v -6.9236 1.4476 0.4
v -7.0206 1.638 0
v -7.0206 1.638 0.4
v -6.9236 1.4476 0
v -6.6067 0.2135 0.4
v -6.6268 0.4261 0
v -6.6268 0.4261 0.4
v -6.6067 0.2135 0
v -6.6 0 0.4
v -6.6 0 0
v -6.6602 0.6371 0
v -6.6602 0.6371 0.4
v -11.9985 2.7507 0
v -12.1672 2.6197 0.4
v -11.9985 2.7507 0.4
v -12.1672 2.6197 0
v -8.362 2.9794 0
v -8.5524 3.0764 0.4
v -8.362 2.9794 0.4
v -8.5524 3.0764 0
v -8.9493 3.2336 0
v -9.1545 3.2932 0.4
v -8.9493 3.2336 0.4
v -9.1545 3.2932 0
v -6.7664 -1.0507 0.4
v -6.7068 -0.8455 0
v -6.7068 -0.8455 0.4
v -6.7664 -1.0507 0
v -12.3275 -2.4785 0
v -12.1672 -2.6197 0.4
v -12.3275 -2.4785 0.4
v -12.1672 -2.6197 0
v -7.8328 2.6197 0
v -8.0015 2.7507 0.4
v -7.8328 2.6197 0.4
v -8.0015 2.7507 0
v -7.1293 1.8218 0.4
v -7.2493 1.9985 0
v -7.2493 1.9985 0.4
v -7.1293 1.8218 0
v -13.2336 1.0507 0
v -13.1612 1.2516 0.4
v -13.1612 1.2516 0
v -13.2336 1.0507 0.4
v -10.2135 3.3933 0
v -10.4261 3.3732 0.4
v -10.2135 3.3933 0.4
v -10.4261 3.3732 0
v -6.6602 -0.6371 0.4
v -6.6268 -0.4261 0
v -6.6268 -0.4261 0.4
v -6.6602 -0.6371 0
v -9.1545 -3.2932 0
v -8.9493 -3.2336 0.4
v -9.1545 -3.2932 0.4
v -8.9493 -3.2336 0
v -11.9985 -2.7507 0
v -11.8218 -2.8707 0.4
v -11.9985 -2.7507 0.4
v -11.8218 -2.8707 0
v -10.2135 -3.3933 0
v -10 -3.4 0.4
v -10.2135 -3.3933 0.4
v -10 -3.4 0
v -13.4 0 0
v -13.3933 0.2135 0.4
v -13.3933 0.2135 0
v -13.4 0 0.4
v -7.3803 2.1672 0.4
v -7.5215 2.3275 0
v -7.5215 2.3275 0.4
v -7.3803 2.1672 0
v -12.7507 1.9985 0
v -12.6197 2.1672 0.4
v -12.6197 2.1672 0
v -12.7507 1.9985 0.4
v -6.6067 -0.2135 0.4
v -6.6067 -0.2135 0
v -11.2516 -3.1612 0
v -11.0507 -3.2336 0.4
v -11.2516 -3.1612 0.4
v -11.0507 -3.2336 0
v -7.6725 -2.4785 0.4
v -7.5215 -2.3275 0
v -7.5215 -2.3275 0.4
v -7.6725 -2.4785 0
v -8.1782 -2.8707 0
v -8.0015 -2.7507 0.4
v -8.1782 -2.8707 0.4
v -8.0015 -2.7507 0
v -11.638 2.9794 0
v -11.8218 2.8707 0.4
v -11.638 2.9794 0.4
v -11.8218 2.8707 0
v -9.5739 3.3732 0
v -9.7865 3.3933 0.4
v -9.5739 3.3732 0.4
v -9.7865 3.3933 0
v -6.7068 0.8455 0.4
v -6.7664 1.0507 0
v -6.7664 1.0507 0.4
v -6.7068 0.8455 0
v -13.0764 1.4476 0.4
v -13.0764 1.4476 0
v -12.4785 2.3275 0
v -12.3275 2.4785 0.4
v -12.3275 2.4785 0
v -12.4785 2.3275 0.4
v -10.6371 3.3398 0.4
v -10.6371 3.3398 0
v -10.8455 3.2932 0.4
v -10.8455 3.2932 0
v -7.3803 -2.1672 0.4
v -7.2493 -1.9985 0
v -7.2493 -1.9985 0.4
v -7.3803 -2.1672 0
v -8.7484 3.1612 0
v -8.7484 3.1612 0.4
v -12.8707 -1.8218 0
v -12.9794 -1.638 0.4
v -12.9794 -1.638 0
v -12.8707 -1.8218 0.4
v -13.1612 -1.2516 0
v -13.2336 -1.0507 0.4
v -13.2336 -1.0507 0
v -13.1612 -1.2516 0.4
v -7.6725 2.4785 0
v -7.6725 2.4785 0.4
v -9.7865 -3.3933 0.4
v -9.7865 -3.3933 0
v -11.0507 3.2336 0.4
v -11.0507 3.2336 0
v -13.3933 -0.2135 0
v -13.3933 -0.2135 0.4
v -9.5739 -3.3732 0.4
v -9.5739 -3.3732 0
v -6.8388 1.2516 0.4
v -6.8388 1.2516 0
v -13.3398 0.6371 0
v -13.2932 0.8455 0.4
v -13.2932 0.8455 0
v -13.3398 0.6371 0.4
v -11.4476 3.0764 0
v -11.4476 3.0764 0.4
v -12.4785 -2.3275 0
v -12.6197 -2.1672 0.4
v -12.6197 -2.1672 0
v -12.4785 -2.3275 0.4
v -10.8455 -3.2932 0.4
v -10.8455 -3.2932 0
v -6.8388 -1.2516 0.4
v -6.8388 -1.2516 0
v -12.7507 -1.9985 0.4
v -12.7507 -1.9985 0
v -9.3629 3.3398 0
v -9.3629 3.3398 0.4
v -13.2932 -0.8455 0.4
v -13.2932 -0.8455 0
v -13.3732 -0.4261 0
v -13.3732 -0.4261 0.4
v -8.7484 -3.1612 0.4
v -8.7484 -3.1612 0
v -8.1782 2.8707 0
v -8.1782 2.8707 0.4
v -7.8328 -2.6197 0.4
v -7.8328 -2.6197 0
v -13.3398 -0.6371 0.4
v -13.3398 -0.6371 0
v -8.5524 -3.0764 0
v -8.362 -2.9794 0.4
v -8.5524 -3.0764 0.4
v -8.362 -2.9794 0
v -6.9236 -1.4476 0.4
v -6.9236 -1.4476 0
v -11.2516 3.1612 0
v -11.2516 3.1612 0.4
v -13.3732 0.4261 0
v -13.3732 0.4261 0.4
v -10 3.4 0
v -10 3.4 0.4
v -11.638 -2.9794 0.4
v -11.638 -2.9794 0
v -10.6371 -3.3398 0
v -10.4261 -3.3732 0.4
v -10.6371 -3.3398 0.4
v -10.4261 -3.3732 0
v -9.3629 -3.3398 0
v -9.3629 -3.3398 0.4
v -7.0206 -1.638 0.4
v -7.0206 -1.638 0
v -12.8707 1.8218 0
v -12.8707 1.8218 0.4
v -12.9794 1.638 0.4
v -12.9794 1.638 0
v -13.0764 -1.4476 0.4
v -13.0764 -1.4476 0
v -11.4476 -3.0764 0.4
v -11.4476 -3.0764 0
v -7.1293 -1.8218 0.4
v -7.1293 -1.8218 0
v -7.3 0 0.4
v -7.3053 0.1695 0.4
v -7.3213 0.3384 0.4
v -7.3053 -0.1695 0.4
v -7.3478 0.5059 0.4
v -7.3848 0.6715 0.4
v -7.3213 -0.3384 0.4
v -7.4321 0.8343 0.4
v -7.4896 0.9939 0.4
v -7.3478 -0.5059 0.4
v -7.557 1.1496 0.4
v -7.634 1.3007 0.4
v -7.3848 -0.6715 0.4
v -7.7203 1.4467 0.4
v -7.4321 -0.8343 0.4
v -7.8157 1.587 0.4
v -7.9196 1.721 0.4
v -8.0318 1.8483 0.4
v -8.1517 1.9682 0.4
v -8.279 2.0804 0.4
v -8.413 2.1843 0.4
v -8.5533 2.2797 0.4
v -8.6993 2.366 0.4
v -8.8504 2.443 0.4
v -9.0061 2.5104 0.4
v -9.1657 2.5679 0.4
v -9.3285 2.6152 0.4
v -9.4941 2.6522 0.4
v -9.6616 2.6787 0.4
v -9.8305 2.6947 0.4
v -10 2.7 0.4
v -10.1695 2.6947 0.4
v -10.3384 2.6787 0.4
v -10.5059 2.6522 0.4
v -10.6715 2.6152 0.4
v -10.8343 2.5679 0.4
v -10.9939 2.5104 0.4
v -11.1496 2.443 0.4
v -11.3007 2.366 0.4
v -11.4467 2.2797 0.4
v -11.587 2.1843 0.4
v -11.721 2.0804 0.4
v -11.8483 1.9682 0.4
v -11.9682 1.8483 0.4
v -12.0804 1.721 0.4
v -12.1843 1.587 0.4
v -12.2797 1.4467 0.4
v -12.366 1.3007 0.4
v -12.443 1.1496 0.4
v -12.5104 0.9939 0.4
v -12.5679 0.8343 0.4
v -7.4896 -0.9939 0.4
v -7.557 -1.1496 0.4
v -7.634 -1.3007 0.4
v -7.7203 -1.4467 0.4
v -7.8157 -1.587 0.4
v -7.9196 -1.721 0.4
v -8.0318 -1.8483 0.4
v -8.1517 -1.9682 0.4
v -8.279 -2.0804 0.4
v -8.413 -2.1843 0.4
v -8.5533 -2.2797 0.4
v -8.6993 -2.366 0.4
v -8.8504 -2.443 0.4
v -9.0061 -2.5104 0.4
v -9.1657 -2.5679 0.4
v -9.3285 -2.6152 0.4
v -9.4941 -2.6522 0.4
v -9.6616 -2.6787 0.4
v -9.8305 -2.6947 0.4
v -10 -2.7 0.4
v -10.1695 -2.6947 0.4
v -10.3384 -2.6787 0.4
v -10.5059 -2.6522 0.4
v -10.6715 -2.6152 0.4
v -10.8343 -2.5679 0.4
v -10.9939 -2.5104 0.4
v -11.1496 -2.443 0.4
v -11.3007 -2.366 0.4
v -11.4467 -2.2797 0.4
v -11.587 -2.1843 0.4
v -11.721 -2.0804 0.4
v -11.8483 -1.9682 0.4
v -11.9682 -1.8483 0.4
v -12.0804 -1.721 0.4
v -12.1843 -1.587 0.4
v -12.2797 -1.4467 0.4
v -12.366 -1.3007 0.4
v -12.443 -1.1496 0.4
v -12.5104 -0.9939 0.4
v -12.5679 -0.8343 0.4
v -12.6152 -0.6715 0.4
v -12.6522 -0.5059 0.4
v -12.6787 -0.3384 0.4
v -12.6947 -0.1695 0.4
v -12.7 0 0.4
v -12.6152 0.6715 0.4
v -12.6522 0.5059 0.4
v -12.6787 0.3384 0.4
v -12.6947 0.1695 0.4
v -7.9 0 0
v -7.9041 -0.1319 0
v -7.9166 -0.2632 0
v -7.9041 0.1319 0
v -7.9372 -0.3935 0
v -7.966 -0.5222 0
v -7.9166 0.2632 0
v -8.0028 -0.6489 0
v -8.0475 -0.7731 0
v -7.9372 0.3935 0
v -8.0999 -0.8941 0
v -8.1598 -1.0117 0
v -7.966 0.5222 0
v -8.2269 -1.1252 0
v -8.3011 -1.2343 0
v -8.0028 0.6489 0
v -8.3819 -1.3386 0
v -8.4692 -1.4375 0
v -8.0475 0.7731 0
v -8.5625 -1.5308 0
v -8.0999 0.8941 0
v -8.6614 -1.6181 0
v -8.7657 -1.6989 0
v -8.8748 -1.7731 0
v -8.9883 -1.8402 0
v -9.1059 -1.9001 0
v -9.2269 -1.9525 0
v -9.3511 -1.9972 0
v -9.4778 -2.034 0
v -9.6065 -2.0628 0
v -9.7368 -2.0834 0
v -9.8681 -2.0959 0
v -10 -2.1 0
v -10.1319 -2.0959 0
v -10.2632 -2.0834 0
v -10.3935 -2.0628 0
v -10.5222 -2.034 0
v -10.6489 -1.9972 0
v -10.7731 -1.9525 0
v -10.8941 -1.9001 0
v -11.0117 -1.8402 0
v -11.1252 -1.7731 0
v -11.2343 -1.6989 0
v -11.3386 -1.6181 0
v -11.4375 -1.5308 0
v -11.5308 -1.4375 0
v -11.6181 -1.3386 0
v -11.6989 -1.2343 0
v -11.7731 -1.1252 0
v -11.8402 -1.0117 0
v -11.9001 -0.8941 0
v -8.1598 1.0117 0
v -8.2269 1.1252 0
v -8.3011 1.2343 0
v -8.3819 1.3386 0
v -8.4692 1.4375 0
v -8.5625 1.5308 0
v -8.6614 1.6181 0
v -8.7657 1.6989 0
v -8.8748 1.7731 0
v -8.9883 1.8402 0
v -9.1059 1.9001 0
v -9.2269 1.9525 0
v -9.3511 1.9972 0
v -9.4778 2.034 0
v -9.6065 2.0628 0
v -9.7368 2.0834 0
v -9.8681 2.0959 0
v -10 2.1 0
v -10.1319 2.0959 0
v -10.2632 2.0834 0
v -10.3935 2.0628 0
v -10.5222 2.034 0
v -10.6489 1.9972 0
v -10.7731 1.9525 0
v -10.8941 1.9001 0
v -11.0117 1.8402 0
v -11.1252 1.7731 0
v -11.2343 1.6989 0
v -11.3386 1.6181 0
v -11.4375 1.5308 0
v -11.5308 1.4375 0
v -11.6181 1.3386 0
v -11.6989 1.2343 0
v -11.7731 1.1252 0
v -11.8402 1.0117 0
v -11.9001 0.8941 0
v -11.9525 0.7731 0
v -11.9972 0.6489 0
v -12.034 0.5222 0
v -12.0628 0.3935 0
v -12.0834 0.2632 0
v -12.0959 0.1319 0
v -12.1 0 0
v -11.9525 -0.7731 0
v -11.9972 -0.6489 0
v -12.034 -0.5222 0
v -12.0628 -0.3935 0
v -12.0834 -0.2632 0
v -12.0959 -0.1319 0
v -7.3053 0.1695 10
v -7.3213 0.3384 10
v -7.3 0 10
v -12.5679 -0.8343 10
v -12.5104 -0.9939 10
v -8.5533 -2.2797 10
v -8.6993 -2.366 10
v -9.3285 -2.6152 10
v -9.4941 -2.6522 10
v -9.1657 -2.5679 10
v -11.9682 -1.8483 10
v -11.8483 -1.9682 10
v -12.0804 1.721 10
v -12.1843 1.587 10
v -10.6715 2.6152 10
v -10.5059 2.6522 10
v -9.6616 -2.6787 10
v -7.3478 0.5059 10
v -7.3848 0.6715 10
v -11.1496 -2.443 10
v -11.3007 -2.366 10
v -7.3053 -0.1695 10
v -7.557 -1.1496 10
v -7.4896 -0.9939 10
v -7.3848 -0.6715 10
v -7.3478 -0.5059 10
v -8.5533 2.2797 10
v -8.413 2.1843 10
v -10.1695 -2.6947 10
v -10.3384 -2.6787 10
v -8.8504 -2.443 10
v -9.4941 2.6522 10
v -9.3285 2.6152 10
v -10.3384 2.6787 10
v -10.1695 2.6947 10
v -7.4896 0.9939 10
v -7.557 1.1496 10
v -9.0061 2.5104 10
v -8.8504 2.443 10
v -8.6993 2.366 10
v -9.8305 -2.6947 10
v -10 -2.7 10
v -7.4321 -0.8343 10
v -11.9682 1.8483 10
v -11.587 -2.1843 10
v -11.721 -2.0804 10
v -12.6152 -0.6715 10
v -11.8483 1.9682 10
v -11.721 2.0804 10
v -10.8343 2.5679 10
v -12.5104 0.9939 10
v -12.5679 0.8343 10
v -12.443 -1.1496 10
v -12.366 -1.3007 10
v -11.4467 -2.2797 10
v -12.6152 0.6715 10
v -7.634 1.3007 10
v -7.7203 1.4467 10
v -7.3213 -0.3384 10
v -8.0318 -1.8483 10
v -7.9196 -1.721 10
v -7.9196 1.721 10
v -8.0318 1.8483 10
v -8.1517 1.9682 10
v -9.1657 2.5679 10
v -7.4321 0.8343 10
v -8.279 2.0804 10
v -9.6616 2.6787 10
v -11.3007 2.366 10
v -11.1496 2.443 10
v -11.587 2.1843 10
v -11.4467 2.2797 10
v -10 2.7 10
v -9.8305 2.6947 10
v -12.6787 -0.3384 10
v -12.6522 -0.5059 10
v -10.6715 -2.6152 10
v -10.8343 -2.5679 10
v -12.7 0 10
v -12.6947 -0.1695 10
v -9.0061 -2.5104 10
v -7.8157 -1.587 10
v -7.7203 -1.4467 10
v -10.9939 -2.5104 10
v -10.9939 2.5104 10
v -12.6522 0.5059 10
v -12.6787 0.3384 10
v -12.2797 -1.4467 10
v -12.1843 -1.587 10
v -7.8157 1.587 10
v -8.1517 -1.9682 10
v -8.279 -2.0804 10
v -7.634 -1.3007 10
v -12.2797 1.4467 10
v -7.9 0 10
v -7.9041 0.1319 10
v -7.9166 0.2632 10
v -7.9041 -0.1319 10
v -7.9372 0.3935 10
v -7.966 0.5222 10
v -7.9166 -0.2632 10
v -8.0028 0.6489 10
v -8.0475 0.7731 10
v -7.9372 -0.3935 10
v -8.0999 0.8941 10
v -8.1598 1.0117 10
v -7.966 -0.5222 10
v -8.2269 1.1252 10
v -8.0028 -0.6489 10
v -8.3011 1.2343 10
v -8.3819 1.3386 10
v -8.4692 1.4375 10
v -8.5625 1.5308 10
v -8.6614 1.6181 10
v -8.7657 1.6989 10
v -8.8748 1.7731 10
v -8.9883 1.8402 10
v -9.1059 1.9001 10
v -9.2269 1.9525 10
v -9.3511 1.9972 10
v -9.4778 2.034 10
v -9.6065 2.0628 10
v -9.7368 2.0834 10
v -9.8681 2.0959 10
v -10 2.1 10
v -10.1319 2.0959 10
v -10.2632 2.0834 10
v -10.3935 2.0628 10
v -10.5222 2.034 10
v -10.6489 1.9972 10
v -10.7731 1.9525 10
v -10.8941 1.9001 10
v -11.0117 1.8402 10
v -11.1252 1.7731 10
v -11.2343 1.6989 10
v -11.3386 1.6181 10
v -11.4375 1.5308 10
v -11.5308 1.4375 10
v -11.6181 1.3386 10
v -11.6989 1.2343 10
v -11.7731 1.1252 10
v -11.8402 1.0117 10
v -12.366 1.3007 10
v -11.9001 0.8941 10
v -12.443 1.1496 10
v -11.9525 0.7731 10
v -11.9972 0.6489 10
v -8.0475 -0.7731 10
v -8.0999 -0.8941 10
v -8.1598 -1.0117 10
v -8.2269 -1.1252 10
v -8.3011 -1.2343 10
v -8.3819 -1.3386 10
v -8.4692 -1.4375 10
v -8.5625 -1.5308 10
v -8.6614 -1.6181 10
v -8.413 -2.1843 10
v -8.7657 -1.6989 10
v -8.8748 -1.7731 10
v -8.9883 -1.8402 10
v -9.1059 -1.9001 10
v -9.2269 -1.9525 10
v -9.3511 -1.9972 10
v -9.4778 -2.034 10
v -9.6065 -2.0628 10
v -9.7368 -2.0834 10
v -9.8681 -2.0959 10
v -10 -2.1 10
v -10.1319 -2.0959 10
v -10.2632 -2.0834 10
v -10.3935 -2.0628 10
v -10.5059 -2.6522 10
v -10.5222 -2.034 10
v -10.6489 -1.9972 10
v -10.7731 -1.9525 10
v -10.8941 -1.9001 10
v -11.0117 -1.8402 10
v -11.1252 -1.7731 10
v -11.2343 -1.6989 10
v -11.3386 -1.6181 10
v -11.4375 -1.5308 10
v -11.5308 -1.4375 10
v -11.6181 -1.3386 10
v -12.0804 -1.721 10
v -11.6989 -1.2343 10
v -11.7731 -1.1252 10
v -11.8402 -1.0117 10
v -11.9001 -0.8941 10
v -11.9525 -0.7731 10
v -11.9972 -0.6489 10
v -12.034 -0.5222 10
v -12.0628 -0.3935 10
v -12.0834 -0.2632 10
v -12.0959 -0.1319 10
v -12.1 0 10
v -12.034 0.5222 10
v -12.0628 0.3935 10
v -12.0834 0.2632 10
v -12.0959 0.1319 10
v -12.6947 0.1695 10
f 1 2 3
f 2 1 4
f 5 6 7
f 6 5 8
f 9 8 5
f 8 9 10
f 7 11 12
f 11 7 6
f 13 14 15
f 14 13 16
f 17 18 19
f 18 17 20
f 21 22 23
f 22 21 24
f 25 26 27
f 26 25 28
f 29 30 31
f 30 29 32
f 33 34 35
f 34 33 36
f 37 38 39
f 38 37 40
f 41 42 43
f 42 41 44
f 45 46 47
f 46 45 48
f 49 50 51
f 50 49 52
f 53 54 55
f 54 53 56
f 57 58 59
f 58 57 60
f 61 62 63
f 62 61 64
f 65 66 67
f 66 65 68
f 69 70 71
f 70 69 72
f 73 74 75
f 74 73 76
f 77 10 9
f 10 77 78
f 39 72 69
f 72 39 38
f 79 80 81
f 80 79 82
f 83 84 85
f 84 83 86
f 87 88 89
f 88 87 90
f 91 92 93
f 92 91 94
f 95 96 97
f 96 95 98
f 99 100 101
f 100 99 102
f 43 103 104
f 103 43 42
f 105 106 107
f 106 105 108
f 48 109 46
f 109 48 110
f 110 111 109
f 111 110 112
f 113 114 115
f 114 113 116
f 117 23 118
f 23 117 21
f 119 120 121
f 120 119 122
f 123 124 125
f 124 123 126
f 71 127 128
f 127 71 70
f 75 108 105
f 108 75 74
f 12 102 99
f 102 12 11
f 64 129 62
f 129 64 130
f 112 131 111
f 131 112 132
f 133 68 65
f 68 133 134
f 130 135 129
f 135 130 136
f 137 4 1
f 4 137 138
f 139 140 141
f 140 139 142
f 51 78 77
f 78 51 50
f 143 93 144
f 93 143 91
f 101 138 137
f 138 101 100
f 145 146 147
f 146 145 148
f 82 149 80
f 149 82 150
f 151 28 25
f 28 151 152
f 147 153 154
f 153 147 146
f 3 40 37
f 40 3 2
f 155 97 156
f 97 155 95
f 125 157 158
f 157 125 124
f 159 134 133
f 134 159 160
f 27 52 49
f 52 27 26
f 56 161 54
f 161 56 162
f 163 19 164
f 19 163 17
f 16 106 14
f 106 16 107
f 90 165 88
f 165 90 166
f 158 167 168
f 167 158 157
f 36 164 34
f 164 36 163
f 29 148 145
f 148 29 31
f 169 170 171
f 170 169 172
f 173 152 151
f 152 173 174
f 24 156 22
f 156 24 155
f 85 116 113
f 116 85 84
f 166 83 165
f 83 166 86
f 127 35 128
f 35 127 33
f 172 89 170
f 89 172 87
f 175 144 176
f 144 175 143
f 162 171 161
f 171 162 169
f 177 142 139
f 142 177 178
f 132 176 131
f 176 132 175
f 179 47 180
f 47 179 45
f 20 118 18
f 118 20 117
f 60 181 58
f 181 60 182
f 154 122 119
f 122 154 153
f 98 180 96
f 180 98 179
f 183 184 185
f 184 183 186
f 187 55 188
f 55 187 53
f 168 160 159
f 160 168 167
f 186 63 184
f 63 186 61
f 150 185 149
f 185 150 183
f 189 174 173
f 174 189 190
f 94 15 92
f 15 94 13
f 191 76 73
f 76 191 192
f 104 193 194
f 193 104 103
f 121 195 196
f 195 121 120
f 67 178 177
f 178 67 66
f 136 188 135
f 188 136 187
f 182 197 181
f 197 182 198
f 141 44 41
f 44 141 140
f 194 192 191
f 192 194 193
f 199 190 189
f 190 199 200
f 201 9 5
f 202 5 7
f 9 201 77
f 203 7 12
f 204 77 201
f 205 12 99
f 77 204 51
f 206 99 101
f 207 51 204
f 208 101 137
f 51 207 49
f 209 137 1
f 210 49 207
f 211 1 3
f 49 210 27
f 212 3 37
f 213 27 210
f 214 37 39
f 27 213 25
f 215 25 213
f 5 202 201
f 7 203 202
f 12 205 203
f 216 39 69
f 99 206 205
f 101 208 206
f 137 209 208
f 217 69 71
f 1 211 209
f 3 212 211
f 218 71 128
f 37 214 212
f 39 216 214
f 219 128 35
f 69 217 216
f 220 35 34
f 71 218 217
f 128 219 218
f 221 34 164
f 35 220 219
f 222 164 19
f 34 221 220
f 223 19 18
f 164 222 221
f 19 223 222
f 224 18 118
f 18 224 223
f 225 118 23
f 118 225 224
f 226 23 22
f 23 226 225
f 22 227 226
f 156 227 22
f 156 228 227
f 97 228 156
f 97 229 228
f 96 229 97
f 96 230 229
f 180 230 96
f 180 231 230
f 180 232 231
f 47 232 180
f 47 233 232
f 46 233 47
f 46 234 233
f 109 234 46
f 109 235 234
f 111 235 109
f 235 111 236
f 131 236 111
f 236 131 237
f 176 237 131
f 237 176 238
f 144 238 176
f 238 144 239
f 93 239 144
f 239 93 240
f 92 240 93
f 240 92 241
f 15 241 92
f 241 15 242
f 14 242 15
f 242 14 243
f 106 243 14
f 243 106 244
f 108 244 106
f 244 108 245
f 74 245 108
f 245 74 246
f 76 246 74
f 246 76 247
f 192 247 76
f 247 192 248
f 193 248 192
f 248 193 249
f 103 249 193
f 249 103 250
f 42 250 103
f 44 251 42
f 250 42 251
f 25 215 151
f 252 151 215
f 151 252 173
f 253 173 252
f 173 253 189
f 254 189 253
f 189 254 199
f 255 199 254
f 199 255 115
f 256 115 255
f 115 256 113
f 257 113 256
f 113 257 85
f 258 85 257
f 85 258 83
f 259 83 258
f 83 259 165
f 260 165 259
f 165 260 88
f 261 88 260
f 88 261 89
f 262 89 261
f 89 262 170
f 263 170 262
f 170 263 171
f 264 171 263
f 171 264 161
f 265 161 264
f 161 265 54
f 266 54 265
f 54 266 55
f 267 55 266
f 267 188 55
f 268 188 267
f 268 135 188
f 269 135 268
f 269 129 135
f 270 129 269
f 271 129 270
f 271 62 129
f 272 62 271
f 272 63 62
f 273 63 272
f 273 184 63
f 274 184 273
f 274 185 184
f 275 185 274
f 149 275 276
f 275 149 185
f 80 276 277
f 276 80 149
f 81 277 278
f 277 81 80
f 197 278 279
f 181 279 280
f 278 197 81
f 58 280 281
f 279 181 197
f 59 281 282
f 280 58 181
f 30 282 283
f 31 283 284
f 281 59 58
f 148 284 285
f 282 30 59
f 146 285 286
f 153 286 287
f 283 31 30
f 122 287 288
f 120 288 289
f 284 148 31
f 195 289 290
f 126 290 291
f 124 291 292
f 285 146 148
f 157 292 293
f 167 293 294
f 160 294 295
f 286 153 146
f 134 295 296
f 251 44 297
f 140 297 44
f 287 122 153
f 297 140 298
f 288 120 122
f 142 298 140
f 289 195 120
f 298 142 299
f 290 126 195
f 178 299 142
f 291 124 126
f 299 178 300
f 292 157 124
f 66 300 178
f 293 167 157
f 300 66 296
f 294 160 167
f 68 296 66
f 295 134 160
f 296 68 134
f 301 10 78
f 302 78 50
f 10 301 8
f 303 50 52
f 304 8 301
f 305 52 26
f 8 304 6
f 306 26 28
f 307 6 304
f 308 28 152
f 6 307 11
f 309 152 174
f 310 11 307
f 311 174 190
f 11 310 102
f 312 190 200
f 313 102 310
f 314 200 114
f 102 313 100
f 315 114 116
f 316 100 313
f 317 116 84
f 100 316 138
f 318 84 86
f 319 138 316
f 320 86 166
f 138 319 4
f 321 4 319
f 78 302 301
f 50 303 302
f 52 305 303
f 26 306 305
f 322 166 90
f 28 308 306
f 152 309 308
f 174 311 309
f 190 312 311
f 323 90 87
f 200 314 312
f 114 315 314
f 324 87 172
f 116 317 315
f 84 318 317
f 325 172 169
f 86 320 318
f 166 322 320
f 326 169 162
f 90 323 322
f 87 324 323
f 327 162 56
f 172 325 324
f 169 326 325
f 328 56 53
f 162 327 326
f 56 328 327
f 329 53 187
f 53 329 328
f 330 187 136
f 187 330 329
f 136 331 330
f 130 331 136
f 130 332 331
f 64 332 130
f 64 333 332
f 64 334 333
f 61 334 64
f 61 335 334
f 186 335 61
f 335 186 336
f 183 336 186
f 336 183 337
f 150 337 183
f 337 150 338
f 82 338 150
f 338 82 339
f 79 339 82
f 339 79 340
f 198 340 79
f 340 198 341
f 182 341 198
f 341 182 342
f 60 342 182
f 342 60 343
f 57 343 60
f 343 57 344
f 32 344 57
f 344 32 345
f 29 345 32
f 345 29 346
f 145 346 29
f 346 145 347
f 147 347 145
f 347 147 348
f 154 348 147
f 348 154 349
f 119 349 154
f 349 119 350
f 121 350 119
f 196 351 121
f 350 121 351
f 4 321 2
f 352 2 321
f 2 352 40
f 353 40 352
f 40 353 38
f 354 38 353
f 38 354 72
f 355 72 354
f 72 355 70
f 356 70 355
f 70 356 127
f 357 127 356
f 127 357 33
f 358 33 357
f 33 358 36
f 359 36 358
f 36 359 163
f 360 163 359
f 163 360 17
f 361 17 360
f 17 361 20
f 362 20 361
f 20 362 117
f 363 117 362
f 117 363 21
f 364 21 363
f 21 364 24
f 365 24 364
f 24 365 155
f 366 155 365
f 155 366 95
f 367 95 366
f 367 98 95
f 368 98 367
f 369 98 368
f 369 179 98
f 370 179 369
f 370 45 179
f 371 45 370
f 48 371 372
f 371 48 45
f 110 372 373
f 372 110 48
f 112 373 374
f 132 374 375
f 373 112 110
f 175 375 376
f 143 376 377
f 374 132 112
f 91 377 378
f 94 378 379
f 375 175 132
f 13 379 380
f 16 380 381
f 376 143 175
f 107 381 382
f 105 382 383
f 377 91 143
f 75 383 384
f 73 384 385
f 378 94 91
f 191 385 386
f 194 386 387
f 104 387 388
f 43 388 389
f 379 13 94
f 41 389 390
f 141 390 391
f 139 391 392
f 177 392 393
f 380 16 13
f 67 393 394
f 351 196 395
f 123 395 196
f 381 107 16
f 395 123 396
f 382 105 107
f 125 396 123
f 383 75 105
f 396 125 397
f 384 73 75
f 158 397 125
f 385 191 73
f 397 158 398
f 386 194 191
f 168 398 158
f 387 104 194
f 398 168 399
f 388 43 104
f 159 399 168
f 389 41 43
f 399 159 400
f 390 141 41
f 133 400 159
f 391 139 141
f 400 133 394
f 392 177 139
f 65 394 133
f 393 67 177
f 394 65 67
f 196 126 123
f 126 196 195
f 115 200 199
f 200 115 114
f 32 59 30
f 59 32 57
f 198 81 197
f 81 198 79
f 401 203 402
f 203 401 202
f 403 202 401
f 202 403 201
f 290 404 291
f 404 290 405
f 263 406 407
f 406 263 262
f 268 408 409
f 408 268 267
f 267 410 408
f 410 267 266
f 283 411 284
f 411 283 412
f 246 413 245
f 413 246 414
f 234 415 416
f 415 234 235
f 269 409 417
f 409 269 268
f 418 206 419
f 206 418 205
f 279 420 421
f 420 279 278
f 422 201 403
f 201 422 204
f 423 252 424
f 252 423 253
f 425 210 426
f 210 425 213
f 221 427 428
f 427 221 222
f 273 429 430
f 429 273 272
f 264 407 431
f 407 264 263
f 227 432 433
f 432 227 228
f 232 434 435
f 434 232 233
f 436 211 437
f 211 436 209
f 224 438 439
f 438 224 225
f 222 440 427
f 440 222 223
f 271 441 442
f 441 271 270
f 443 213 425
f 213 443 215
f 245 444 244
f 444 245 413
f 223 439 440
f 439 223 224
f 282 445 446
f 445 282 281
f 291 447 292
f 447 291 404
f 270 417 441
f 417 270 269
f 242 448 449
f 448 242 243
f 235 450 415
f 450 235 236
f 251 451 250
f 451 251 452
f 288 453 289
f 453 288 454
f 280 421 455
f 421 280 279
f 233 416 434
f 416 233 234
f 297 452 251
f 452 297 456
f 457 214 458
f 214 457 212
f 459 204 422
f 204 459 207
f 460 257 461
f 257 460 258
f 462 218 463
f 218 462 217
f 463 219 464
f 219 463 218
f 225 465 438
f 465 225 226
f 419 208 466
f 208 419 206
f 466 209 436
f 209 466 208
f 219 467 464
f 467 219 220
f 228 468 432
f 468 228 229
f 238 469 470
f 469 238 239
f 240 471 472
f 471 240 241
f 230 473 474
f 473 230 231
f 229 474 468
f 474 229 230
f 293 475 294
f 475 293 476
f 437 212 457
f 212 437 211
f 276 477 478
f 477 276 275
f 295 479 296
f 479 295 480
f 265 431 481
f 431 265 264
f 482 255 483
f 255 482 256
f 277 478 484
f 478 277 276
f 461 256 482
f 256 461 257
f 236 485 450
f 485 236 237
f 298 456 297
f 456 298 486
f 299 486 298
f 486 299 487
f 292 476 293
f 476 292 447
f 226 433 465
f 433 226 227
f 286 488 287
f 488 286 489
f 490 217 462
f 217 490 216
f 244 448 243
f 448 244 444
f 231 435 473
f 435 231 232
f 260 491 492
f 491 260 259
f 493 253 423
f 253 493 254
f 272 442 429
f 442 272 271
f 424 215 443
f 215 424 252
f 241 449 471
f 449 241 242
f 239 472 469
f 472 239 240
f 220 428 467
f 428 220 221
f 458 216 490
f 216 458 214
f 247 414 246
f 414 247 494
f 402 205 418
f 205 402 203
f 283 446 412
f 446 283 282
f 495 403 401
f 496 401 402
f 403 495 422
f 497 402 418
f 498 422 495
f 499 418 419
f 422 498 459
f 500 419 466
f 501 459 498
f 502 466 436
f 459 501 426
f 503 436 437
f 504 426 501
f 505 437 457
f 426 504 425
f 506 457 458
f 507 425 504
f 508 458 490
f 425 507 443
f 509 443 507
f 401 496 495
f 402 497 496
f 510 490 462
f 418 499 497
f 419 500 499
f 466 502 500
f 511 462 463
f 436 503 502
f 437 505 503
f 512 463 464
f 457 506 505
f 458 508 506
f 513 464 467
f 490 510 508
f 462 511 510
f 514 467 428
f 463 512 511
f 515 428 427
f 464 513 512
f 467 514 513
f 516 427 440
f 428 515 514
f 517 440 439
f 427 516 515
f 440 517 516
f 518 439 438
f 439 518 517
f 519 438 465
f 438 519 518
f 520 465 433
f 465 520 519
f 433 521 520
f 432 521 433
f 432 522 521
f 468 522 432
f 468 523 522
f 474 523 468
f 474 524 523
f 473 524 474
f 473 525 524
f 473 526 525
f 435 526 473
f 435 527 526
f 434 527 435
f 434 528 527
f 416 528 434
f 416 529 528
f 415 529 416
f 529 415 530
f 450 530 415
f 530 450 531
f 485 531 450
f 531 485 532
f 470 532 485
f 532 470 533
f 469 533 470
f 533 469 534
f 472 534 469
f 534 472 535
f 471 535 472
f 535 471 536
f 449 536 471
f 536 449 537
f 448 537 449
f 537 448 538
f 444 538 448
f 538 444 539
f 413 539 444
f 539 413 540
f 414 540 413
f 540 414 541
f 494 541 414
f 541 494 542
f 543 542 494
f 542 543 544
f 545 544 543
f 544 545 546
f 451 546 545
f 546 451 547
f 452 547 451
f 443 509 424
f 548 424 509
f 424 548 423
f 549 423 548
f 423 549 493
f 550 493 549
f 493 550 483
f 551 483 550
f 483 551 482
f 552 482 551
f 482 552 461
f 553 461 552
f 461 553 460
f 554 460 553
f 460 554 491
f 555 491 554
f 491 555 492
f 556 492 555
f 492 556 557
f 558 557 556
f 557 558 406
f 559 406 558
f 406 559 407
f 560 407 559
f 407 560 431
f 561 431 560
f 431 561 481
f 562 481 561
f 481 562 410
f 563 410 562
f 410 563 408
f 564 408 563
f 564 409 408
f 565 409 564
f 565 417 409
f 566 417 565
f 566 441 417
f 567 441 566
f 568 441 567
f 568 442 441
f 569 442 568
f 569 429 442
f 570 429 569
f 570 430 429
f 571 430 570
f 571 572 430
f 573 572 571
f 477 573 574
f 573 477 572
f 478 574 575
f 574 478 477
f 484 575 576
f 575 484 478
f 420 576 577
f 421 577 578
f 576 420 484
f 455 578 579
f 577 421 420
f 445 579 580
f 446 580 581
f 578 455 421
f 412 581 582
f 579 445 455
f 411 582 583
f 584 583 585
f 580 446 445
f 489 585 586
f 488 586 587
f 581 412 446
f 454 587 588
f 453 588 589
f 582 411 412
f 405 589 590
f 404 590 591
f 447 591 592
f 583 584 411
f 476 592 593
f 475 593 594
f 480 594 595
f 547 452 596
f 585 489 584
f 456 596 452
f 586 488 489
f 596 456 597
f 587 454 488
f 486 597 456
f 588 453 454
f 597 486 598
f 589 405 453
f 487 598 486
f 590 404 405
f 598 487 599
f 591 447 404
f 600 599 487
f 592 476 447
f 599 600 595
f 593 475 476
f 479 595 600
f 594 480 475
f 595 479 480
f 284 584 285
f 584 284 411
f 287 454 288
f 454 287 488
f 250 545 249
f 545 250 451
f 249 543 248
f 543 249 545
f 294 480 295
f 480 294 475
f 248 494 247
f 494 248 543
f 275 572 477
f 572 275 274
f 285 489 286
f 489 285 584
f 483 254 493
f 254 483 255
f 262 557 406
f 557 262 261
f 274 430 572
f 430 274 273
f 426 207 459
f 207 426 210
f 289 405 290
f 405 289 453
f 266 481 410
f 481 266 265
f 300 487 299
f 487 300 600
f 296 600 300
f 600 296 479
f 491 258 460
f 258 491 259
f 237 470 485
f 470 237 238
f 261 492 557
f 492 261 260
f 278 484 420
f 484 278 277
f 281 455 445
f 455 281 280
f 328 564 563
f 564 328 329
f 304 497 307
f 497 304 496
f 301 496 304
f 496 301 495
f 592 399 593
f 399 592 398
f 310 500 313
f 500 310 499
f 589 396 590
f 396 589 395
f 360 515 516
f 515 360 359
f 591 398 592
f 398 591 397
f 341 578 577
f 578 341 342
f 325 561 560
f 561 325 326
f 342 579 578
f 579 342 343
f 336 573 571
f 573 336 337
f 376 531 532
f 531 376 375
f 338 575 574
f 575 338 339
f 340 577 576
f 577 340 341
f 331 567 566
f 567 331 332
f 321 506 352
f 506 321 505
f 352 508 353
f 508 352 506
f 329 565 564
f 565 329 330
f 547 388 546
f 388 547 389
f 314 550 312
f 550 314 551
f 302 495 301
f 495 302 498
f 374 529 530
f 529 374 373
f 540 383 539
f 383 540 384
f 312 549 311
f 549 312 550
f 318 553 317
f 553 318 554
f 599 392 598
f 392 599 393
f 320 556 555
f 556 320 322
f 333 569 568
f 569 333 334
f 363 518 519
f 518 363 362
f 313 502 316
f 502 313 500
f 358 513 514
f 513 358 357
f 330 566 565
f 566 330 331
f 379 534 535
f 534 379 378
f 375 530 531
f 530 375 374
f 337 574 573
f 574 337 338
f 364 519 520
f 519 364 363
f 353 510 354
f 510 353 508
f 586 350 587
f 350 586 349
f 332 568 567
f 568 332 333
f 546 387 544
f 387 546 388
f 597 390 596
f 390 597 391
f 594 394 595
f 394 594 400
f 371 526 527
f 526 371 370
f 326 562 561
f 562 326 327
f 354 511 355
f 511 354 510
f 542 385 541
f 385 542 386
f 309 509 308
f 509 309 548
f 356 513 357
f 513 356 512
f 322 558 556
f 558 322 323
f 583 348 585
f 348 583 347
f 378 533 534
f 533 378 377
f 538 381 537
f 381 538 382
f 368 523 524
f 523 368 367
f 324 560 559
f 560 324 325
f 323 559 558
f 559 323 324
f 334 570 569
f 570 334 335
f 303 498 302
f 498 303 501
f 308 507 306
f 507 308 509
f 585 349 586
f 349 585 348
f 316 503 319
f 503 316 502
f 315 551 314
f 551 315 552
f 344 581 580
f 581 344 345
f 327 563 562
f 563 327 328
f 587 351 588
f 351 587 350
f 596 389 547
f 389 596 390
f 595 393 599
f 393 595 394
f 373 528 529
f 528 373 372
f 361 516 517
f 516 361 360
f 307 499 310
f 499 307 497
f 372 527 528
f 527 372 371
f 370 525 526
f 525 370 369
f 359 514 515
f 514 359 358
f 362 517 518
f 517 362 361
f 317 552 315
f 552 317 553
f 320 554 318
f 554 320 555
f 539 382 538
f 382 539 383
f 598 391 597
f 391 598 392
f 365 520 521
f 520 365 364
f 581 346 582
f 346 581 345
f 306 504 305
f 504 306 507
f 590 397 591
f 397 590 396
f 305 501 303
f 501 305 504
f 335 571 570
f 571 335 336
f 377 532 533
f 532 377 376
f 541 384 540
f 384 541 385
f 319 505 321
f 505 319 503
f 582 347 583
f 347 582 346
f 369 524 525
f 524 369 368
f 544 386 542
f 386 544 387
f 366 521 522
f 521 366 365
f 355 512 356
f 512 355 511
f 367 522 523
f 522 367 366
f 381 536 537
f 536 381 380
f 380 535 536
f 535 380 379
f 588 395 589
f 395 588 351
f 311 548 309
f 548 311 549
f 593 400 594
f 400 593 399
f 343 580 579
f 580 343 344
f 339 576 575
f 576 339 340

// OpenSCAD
show_top = 0;
show_bottom = 0;
show_vtulku = 1;

wall = 3;
usb_width = 14;
usb_depth = 17;
usb_petal_depth_pos = 8.6;
usb_metal_depth = 11.5;
usb_height = 6;

petal_hole_width = 2;
petal_hole_depth = 3;
petal_hole_height = 5;

bolt_d = 5;
bolt_head_d = 7;

wire_hole_d = 6;
vtulka_pad = 0.6;
vtulka_skirt = 0.8;
vtulka_wall = 1.2;
  
module usb_female_case(){
  difference(){
    translate(v=[wall, wall, 0]) {
      minkowski(){
        cube(size=[usb_width+wall, usb_depth, usb_height+wall]);
        sphere(r=wall, $fn=30);  
      }
    }
    // to cut out bottom excess
    translate(v=[0,0, -wall]) {
      cube(size=[usb_width+3*wall,usb_depth+3*wall, wall]);
    }
    
    translate(v=[wall+wall/2, 0, petal_hole_height]) {
      cube(size=[usb_width, usb_depth, usb_height]);
    }
    translate(v=[wall+wall/2, 2, petal_hole_height-1]) {
      cube(size=[usb_width, usb_depth-2, usb_height]);
    }
    translate(v=[wall+wall/2, usb_metal_depth, petal_hole_height-4]) {
      cube(size=[usb_width, usb_depth-usb_metal_depth, usb_height]);
    }
    
     // holes for usb female petals
    for(pos=[0, usb_width-petal_hole_width]) {
      translate(v=[wall*1.5+pos, usb_petal_depth_pos-petal_hole_depth/2, 0]) {
          cube(size=[petal_hole_width, petal_hole_depth, petal_hole_height]);
          hull() {
            translate(v=[0, 0, wall/2]) {
              cube(size=[petal_hole_width, petal_hole_depth, 1]);
            }
            translate(v=[-2, 0, 0]) {
              cube(size=[petal_hole_width+4, petal_hole_depth, 1]);
            }
          }
      }
    }
    // wire_hole
    translate(v=[(usb_width+wall+2*wall)/2, usb_depth, -1]) {
      cylinder(h=wall+wall, d=wire_hole_d, $fn=100);
    }
    translate(v=[(usb_width+wall+2*wall)/2, usb_depth, 1]) {
      cylinder(h=wall+wall, d=wire_hole_d + vtulka_skirt+vtulka_pad+0.4, $fn=100);
    }
  }
  translate(v=[usb_width+3*wall-0.1,usb_depth/2+3,0]) {
    ushko();
  }
  translate(v=[0.1,usb_depth/2+3,0]) rotate(a=[0,0,180]) {
    ushko();
  }
  
}
module ushko(){
  r1 = bolt_d/2;
  r2 = bolt_head_d/2;
  h = wall;
  translate(v=[r2, 0, 0])
    difference(){
      minkowski(){
        cylinder(h=h, r=r2+wall, $fn=3);
        sphere(r=wall, $fn=30);  
      }
      // to cut out excess
      translate(v=[-r2-2*wall,-r2-2*wall, -wall]) {
        cube(size=[10*(r2+wall), 10*(r2+wall), wall]);
      }
      // hole for bolt
      translate(v=[2,0, wall]) {
        cylinder(r1=r1, r2=r2, h=h, $fn=60);
      }
      translate(v=[2,0, 0]) {
        cylinder(r=r1, h=wall, $fn=60);
      }
    }
}

module vtulka(){
    $fn=100;
    difference(){
      union(){
        cylinder(h=0.4, d=wire_hole_d+vtulka_skirt);    
        cylinder(h=10, d=wire_hole_d-vtulka_pad);
      }
      cylinder(h=10, d=wire_hole_d-vtulka_wall-vtulka_pad);
  }
}


module slice(bottom=true){
  z = (bottom)?wall+wall+0.2:0;
  offset = (bottom)?0:0.4;

  module cut(){
    difference(){
      usb_female_case();
      translate(v=[-50,-50, z]) {
        cube(size=[100, 100, usb_height]);
      }
    }
  }
  module pazz(){
    translate(v=[(usb_width+wall+2*wall)/2-7-(1.2+offset), 5-offset/2, 6]) {
      cube(size=[1.2+offset,10+offset,2+offset]);
    }
    translate(v=[(usb_width+wall+2*wall)/2+7, 5-offset/2, 6]) {
      cube(size=[1.2+offset,10+offset,2+offset]);
    }
  }

  if(bottom){
    cut(); 
    pazz(); 
  }else {
    difference(){
     cut();
     color("red")
      pazz(); 
    }
  }

}

if(show_top)
  translate([0, 0, 5])
    slice(bottom=false); //top

if(show_bottom)
  color("red", 0.9)
    slice(bottom=true); //bottom

if(show_vtulku)
  translate([-10, 0, 0])
    vtulka();
